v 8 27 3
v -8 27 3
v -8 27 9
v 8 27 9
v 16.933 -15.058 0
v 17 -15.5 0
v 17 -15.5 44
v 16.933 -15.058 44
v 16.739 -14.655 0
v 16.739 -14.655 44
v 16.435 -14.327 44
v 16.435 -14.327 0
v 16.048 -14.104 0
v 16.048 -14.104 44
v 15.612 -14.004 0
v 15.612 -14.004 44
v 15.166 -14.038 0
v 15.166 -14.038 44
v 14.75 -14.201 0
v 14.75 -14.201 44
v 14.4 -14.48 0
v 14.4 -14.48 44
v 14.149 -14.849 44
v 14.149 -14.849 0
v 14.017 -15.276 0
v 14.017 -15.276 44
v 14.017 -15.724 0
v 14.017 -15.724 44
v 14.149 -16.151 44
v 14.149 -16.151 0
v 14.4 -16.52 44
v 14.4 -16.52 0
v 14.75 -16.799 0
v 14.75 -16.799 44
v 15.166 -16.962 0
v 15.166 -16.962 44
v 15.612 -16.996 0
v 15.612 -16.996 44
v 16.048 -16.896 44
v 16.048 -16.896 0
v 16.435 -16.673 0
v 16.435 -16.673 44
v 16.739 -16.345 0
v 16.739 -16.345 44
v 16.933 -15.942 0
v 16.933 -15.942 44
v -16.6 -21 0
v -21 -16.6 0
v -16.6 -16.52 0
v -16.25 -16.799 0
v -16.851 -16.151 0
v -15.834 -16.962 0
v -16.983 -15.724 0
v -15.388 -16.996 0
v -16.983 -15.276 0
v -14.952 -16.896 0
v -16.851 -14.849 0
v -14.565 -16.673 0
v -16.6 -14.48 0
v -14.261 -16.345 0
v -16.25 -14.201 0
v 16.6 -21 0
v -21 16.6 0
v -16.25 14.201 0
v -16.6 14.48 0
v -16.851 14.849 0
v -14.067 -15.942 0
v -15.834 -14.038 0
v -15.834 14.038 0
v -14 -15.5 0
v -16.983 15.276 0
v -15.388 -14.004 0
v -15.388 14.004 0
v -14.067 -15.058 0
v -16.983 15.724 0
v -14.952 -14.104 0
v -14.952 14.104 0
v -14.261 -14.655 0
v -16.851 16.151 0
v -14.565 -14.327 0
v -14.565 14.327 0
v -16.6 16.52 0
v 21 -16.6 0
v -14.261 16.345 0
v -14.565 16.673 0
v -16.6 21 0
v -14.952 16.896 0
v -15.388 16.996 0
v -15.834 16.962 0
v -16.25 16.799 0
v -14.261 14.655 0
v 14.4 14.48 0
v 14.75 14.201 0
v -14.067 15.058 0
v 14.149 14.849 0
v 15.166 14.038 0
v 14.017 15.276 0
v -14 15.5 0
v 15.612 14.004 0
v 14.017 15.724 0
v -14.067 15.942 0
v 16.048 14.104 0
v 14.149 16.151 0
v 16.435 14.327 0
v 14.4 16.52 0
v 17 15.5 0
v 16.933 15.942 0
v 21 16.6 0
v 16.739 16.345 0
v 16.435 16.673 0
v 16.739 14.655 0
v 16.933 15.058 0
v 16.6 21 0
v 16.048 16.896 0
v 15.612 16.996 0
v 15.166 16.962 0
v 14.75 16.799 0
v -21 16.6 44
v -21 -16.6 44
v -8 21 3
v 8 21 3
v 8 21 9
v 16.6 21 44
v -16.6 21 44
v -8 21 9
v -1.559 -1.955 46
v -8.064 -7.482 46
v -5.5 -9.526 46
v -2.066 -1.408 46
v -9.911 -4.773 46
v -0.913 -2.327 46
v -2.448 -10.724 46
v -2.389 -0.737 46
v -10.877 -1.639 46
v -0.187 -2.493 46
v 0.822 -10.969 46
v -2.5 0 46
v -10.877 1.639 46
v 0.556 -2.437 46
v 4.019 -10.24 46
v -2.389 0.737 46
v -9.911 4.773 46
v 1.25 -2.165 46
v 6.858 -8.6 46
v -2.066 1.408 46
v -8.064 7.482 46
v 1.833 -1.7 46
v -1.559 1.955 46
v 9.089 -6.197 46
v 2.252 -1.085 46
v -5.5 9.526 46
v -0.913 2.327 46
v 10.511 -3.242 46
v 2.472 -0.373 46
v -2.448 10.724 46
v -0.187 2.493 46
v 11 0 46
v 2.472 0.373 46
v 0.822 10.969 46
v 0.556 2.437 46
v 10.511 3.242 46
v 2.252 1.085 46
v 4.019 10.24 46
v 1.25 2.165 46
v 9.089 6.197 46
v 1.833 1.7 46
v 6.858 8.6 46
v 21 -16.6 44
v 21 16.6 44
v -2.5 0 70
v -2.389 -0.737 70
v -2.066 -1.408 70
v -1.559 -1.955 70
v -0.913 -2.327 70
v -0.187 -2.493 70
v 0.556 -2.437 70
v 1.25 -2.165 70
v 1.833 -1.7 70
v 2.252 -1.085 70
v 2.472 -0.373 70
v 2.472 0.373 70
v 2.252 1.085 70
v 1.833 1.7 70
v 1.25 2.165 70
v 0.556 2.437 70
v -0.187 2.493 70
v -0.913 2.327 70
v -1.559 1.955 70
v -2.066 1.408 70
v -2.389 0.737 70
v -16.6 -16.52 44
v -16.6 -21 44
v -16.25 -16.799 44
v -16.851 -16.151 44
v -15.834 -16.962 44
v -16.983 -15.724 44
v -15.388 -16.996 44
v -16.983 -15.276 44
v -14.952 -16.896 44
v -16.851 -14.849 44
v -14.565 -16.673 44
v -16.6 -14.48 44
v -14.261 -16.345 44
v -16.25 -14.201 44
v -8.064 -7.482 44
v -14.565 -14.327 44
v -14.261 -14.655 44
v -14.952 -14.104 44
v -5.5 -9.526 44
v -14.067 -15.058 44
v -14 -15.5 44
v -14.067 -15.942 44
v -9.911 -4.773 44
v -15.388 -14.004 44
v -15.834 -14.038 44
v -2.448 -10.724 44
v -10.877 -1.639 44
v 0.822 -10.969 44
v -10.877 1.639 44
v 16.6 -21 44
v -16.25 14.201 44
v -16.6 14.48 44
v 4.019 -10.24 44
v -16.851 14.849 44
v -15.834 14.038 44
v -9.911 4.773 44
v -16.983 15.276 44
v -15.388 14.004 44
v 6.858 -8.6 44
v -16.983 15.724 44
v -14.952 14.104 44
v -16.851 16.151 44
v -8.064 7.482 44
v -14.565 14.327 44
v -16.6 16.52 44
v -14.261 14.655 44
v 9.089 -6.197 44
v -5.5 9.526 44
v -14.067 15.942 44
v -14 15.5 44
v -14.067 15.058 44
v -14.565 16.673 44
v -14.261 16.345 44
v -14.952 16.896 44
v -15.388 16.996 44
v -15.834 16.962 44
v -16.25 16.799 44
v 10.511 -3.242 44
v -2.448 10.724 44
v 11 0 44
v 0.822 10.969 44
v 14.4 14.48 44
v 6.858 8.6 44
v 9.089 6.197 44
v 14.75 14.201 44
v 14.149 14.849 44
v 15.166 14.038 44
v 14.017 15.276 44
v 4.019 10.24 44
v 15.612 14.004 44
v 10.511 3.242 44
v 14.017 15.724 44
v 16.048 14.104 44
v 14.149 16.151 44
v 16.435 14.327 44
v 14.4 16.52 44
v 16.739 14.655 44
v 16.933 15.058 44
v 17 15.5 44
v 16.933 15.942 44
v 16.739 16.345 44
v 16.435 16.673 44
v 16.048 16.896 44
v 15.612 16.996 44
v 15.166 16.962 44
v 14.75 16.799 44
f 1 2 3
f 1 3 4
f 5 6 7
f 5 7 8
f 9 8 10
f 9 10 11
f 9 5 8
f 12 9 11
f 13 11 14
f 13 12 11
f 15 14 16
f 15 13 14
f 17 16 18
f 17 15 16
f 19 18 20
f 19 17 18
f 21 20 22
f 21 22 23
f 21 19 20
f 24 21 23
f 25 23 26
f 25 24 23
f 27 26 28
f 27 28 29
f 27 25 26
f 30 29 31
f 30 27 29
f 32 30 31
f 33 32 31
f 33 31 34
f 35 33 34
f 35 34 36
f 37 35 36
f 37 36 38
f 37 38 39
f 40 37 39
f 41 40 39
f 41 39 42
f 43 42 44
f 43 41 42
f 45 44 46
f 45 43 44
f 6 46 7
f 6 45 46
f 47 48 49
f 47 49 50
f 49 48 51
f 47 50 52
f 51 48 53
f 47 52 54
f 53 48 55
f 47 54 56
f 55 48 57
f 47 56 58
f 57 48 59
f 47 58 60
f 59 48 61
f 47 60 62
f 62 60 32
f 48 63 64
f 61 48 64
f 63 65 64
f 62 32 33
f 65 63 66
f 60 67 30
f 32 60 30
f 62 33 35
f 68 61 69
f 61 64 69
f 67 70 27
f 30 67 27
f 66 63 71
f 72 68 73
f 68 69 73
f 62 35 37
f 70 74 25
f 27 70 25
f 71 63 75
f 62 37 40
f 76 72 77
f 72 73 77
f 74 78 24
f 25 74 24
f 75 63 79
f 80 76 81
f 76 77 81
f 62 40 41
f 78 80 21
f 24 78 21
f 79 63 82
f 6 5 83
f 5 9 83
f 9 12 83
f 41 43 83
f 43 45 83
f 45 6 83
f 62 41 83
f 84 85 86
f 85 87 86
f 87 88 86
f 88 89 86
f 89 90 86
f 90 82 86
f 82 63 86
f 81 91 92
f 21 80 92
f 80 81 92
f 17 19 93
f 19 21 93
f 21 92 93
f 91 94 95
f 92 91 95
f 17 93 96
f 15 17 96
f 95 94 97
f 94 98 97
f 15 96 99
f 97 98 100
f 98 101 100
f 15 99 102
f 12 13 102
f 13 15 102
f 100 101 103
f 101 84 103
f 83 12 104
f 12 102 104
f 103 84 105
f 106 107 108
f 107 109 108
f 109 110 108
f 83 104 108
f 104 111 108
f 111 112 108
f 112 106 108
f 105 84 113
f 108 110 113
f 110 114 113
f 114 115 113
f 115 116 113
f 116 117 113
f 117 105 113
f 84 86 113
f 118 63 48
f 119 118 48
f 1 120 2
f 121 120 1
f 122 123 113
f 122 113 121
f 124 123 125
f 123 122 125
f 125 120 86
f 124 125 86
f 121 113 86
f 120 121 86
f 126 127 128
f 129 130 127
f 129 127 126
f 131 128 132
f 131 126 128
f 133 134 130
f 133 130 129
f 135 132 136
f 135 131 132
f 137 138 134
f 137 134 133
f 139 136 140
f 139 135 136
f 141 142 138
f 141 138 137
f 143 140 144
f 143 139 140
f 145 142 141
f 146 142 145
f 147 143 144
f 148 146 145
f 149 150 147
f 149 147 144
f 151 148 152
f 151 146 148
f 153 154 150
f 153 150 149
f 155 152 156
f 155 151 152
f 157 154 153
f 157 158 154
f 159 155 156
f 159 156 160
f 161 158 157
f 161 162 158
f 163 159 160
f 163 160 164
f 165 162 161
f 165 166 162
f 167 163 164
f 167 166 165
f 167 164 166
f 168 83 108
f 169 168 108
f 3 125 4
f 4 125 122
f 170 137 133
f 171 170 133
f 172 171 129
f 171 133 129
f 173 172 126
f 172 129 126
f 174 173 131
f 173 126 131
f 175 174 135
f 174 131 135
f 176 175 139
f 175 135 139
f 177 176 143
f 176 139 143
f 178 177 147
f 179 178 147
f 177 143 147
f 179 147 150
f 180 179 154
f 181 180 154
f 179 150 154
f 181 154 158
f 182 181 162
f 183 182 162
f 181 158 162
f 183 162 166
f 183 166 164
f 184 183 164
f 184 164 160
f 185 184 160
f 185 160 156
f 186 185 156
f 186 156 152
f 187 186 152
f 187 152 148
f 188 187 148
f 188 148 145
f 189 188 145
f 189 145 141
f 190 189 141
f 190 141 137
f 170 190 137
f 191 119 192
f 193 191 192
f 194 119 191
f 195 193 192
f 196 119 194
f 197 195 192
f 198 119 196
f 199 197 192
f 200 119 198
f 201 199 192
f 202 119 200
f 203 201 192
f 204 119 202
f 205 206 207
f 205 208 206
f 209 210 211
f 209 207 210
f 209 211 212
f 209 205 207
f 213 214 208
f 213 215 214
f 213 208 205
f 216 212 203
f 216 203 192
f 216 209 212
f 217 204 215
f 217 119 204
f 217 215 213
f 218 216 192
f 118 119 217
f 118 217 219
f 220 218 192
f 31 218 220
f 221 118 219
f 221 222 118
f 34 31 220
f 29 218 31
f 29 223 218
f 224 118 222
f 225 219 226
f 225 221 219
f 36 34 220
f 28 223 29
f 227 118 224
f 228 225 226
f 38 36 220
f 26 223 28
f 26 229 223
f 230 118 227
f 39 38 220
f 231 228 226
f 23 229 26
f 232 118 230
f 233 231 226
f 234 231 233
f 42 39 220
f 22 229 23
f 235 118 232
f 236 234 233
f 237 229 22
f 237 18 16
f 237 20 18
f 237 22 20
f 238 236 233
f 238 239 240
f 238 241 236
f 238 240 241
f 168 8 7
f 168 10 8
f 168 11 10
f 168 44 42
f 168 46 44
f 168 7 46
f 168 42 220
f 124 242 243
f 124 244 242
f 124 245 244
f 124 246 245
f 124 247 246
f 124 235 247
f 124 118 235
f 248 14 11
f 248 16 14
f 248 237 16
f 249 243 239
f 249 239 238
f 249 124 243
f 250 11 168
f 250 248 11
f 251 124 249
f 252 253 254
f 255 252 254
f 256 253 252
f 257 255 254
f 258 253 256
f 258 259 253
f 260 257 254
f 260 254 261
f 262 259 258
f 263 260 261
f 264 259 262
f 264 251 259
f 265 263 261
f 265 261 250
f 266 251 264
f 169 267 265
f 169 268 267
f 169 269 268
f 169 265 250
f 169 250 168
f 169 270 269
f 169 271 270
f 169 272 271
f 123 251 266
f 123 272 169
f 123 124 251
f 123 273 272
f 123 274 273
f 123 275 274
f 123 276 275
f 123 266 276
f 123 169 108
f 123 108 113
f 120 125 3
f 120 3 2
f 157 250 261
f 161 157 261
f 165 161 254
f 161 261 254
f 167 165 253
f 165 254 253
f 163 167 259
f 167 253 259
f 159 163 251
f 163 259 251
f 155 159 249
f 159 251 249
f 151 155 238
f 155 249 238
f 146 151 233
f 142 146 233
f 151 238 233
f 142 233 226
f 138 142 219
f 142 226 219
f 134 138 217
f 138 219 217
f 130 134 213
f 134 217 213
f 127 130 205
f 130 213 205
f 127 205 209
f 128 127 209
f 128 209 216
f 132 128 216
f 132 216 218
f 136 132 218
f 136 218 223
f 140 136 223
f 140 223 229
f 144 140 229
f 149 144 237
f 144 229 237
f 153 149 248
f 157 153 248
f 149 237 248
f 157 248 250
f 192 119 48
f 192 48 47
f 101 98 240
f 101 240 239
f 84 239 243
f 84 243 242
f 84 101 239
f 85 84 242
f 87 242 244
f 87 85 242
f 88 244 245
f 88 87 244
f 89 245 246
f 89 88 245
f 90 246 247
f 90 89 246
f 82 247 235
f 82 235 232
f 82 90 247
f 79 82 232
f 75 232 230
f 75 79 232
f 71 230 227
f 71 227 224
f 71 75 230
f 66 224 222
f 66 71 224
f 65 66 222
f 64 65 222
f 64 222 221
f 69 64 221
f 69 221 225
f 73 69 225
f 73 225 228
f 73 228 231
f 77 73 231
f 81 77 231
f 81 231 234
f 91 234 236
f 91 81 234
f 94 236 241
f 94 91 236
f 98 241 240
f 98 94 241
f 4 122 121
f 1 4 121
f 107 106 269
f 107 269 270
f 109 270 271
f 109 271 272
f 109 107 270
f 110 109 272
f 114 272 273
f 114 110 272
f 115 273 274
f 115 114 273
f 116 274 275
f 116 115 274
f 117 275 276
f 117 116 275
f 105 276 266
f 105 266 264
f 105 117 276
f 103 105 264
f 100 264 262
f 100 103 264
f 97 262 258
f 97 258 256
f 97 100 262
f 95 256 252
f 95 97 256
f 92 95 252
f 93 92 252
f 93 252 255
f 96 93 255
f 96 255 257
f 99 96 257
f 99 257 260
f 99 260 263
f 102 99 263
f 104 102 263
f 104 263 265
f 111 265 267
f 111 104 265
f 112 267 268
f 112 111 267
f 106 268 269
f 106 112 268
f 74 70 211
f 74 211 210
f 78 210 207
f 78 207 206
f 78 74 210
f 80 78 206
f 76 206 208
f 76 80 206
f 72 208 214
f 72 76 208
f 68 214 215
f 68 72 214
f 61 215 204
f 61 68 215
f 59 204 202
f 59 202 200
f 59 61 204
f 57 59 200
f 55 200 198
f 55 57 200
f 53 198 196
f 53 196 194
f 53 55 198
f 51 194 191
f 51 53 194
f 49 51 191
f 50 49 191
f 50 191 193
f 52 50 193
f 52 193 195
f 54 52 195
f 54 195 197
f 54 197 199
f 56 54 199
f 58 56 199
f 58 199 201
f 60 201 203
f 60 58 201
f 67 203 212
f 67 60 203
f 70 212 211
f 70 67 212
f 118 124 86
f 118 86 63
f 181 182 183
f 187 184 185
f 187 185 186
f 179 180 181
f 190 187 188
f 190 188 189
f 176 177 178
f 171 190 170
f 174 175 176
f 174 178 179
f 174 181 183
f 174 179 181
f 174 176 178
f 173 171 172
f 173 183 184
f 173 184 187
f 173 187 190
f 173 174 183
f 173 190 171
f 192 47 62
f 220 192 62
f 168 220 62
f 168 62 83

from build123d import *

# Parameters (mm, degrees)
SKETCH_1_R      = 1.5
EXTRUDE_1_DEPTH = 44
SKETCH_2_R      = 11
EXTRUDE_2_DEPTH = 2
SKETCH_3_R      = 2.5
EXTRUDE_3_DEPTH = 26
SKETCH_4_W      = 16
SKETCH_4_H      = 6
EXTRUDE_4_DEPTH = 6


with BuildPart() as part:
    # 草图1 → 凸台-拉伸1 (new body)
    with BuildSketch(Plane.XY):
        Polygon((21, 0), (21, 16.6), (16.6, 21), (0, 21), (-16.6, 21), (-21, 16.6), (-21, 0), (-21, -16.6), (-16.6, -21), (0, -21), (16.6, -21), (21, -16.6), align=None)
        with Locations((15.5, 15.5)):
            Circle(SKETCH_1_R, mode=Mode.SUBTRACT)
        with Locations((15.5, -15.5)):
            Circle(SKETCH_1_R, mode=Mode.SUBTRACT)
        with Locations((-15.5, -15.5)):
            Circle(SKETCH_1_R, mode=Mode.SUBTRACT)
        with Locations((-15.5, 15.5)):
            Circle(SKETCH_1_R, mode=Mode.SUBTRACT)
    extrude(amount=EXTRUDE_1_DEPTH)

    # 草图2 → 凸台-拉伸2 (add)
    with BuildSketch(Plane.XY.offset(44)):
        Circle(SKETCH_2_R)
    extrude(amount=EXTRUDE_2_DEPTH)

    # 草图3 → 凸台-拉伸3 (add)
    with BuildSketch(Plane.XY.offset(44)):
        with Locations(Location((0, 0, 0), (0, 0, 180))):
            Circle(SKETCH_3_R)
    extrude(amount=EXTRUDE_3_DEPTH)

    # 草图4 → 凸台-拉伸4 (add)
    with BuildSketch(Plane(origin=(0, 21, 0), x_dir=(1, 0, 0), z_dir=(0, 1, 0))):
        with Locations((0, -6)):
            Rectangle(SKETCH_4_W, SKETCH_4_H)
    extrude(amount=EXTRUDE_4_DEPTH)


solid = part.part
